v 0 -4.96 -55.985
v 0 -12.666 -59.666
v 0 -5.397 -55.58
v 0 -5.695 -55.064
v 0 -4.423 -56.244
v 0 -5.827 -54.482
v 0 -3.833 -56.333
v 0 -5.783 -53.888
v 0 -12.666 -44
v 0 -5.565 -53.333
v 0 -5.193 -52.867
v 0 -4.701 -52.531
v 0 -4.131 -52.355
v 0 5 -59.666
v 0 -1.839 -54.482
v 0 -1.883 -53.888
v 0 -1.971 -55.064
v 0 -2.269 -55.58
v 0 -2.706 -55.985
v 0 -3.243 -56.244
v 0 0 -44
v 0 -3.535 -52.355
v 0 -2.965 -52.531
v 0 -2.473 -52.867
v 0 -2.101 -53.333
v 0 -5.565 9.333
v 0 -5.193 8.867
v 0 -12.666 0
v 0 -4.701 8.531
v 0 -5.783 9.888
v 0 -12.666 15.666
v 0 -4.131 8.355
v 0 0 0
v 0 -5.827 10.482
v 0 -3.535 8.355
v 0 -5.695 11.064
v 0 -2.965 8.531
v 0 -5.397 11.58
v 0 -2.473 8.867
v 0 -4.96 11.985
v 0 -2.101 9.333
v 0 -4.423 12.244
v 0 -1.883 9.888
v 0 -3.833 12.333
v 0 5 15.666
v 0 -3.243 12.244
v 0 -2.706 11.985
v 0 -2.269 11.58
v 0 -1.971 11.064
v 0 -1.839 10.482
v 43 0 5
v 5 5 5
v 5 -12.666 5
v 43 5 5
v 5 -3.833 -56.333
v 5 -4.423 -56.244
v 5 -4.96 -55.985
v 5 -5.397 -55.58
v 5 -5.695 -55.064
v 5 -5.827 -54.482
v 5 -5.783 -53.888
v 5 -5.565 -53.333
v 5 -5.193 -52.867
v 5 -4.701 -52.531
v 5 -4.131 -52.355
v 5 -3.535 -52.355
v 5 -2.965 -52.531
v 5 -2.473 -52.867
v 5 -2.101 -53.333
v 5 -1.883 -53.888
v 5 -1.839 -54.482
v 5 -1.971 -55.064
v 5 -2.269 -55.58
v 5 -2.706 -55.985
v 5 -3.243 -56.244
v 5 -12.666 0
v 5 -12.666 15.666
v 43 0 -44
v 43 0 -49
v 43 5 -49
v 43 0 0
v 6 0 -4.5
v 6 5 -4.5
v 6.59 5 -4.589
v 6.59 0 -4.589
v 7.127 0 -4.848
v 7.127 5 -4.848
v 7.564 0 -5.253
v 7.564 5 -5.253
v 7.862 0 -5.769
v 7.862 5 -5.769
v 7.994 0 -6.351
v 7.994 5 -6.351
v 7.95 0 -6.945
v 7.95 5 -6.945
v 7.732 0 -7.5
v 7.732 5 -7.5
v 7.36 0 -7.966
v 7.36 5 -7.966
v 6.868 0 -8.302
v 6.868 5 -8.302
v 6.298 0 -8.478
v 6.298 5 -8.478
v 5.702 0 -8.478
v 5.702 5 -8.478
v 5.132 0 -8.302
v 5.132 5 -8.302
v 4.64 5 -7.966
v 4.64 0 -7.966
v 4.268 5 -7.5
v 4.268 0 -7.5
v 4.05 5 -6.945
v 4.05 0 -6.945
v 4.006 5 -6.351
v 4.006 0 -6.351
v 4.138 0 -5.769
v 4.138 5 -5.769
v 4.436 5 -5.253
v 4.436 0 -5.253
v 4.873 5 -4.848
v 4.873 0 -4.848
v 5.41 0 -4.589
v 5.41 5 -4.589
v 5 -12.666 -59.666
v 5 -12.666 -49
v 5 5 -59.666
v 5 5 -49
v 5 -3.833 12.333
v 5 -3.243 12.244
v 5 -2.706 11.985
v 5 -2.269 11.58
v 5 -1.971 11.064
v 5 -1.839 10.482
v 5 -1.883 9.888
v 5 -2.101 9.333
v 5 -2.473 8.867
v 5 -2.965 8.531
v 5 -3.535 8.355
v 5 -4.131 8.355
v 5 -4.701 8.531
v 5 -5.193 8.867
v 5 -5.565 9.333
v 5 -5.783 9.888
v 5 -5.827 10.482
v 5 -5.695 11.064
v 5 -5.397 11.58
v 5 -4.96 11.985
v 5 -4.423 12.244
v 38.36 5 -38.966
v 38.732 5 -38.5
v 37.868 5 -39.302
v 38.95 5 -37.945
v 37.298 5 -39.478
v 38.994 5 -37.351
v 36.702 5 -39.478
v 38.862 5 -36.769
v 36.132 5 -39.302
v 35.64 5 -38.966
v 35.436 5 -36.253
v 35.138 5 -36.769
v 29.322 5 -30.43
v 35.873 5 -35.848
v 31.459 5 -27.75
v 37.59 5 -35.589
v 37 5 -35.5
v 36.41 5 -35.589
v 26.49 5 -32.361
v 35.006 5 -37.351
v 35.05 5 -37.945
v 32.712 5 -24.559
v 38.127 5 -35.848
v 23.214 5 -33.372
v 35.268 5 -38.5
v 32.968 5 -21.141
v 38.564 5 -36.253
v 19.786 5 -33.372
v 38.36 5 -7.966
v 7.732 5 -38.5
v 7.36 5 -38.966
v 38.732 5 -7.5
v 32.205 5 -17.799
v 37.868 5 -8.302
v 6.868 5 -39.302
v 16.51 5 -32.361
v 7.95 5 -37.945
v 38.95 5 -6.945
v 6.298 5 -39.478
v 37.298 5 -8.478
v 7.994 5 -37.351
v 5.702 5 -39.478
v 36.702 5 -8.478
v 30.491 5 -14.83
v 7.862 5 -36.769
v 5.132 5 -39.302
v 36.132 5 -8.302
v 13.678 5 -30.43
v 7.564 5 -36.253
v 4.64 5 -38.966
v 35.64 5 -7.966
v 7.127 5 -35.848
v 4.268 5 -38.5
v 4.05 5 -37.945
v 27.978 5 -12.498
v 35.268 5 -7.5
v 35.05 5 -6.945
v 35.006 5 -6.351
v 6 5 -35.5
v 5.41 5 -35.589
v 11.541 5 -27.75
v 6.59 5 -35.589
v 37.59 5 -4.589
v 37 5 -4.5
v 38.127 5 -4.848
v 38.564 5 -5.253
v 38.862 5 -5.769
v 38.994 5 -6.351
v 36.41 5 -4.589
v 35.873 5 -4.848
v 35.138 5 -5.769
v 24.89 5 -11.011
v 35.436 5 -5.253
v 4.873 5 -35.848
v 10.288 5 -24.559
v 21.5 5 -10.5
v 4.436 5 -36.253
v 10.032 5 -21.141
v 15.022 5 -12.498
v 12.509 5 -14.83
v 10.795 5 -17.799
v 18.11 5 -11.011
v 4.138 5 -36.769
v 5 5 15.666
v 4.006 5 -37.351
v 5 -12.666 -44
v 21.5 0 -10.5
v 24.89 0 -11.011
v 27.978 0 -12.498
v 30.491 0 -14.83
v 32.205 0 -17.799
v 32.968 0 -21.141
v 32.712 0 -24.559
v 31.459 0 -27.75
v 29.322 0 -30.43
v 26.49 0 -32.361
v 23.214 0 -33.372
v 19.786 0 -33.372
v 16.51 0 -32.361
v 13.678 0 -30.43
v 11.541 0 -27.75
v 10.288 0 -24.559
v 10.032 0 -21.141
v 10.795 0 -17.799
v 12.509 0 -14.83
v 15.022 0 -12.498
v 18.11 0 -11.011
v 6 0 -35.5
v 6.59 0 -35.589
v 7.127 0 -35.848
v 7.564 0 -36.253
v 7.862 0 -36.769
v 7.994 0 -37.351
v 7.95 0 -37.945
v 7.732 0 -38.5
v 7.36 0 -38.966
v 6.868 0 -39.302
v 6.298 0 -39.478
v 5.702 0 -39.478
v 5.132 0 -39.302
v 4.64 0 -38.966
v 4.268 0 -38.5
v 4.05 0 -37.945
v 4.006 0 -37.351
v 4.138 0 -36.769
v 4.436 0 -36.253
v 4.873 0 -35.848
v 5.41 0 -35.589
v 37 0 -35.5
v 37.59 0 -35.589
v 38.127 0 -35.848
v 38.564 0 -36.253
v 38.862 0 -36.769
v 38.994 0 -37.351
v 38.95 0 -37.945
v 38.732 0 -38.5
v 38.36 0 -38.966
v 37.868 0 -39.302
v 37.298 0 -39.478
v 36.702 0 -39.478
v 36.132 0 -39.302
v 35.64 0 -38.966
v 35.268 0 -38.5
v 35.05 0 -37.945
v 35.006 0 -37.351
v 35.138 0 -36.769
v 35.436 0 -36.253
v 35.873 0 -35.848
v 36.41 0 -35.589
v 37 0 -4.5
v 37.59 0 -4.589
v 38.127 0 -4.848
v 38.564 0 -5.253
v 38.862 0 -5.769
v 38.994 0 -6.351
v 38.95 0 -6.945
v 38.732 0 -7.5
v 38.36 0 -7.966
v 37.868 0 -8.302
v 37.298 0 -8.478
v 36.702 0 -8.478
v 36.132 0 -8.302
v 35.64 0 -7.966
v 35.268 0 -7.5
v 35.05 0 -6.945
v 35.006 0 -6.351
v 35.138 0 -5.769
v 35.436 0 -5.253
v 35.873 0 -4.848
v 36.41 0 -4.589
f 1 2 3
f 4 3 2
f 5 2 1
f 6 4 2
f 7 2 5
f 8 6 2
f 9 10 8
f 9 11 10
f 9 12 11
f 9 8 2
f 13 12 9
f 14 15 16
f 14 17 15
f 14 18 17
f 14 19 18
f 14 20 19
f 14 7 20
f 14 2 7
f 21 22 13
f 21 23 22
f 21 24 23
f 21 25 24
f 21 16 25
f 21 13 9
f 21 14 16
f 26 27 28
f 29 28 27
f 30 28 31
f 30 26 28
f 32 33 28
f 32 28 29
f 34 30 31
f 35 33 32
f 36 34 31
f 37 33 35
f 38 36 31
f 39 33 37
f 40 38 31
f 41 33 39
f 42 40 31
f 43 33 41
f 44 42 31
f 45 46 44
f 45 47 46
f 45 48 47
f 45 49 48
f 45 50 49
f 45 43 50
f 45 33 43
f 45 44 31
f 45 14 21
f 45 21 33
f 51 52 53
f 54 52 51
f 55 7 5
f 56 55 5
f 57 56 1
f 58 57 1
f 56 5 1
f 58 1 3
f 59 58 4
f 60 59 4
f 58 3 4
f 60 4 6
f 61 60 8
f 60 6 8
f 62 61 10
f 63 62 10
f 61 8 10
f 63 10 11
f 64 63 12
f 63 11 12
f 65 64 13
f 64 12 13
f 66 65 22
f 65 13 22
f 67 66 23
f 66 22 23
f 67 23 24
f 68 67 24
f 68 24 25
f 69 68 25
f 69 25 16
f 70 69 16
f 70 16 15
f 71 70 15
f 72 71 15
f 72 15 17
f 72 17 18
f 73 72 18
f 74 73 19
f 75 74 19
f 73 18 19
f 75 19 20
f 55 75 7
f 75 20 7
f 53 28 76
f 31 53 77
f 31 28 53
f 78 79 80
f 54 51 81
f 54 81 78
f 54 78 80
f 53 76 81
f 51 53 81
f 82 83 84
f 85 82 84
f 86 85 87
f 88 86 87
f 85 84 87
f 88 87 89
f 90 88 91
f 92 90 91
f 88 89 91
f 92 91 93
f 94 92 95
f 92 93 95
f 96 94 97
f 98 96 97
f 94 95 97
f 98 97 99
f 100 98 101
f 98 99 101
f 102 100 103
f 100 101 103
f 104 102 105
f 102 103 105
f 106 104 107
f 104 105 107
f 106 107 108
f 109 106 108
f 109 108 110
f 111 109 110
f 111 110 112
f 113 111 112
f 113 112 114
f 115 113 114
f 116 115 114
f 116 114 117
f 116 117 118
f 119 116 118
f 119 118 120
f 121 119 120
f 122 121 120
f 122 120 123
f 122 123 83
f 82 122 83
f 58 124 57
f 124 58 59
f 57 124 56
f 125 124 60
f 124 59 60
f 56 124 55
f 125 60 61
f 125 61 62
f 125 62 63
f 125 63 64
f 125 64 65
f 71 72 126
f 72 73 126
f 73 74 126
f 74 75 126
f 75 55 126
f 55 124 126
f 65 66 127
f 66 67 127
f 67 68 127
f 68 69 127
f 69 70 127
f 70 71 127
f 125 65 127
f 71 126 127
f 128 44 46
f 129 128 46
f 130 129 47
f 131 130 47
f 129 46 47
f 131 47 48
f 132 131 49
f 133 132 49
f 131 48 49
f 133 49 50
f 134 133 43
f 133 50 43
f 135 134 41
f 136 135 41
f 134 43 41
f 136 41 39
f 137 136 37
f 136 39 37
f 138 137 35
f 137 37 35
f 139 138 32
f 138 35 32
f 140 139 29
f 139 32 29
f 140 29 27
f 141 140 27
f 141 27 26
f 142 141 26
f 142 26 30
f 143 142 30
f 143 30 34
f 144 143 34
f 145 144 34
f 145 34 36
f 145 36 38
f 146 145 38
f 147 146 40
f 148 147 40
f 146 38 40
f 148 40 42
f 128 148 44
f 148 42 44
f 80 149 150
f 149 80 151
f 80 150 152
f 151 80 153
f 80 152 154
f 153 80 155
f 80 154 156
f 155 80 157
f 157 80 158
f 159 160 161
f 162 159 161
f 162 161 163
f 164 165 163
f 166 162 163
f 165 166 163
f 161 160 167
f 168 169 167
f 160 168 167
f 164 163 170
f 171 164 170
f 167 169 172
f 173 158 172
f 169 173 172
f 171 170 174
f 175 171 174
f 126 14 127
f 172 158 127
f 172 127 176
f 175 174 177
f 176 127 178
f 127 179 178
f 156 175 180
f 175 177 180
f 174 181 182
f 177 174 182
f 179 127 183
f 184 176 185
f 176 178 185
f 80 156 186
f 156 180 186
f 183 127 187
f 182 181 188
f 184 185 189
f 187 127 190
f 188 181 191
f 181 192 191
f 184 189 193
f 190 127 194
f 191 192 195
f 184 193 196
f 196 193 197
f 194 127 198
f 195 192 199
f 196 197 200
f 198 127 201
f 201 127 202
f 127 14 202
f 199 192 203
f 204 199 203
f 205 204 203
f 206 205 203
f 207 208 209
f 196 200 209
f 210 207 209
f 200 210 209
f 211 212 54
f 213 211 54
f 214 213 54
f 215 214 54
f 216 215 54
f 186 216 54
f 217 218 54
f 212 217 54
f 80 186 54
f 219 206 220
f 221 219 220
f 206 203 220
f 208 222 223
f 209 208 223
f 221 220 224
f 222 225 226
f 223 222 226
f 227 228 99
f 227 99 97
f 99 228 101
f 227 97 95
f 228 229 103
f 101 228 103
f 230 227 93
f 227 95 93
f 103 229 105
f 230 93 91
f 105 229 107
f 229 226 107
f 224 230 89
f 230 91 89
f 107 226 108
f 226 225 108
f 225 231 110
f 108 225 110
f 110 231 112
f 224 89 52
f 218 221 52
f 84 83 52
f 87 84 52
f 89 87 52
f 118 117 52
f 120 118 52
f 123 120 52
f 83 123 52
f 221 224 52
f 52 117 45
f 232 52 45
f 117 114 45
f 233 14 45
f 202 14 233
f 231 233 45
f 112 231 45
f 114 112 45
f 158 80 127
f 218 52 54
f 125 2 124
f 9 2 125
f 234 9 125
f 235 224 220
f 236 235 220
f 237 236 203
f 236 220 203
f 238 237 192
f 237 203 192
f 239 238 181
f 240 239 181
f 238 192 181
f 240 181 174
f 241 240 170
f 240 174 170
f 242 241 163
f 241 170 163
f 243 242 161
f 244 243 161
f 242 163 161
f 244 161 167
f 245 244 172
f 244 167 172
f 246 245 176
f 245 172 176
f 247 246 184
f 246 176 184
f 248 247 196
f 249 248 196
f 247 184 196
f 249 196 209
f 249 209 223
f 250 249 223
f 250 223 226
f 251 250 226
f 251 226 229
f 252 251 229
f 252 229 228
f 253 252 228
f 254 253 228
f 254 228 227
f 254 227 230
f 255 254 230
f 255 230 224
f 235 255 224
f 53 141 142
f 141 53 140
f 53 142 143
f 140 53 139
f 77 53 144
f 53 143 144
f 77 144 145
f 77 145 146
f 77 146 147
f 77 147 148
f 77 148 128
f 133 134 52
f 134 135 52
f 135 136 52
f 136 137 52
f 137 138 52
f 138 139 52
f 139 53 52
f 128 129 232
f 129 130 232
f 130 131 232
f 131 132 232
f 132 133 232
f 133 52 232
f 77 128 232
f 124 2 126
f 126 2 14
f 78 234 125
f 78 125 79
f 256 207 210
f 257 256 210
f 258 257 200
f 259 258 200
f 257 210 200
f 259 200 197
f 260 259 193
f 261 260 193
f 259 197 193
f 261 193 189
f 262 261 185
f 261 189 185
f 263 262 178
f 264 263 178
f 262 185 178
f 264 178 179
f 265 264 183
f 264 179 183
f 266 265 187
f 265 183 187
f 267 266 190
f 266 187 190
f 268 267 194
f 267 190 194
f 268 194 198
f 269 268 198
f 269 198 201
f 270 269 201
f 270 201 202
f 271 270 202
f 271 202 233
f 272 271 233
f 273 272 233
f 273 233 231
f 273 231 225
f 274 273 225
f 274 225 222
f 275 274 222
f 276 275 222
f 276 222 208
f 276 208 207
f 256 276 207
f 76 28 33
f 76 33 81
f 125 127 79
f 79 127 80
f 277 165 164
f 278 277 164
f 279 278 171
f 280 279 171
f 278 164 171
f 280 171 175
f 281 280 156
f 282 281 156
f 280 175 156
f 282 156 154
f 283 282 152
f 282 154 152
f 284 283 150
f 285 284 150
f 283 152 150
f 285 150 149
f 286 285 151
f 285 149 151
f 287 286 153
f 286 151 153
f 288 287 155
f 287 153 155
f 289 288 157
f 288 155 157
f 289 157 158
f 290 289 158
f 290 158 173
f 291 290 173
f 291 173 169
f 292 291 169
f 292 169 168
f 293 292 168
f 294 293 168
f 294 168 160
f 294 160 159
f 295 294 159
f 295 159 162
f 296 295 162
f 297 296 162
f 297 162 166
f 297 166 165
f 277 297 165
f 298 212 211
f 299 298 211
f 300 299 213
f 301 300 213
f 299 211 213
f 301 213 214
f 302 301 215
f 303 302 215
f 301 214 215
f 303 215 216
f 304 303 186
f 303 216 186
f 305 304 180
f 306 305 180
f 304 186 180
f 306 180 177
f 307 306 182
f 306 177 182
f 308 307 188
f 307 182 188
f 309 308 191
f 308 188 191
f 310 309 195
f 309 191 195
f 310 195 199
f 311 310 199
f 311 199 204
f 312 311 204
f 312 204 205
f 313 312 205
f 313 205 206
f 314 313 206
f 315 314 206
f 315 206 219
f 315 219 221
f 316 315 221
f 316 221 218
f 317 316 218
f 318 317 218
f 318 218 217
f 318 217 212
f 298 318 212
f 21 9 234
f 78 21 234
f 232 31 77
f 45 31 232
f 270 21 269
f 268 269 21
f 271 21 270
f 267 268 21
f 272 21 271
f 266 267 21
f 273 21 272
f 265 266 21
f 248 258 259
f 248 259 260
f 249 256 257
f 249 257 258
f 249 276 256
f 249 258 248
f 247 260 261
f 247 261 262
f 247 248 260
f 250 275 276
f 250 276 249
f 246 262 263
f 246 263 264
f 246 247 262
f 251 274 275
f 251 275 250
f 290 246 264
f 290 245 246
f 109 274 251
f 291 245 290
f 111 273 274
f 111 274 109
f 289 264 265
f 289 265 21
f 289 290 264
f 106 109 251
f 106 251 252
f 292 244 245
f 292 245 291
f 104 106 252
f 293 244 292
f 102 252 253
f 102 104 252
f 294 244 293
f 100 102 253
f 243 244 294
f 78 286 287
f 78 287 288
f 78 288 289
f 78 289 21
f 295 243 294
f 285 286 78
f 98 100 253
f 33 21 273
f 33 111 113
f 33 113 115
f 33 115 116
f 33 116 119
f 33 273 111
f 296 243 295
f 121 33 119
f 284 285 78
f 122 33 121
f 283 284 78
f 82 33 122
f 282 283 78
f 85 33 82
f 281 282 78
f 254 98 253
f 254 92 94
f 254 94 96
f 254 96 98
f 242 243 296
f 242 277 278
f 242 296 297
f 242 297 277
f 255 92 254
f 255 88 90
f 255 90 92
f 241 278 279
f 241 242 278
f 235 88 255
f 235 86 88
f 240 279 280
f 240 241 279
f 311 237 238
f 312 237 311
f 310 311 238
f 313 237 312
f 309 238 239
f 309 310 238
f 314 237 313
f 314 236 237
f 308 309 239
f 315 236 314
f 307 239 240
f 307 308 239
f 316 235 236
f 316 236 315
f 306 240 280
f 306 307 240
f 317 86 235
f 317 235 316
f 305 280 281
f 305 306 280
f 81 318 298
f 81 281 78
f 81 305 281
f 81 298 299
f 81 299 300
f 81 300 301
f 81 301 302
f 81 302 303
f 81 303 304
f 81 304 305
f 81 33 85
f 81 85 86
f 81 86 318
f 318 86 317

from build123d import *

# Parameters (mm, degrees)
SKETCH1_W           = 5
SKETCH1_H           = 5
SKETCH1_W_2         = 38
BOSS_EXTRUDE1_DEPTH = 44
SKETCH2_R           = 11.5
SKETCH2_R_2         = 2
CUT_EXTRUDE1_DEPTH  = 62.725197448
SKETCH1_3_W         = 38
SKETCH1_3_H         = 5
SKETCH1_3_W_2       = 5
SKETCH1_3_H_2       = 12.666
BOSS_EXTRUDE2_DEPTH = 5
BOSS_EXTRUDE3_START = -44
SKETCH1_4_W         = 5
SKETCH1_4_H         = 5
SKETCH1_4_H_2       = 12.666
SKETCH1_4_W_2       = 38
BOSS_EXTRUDE3_DEPTH = 5
SKETCH3_W           = 10.666
SKETCH3_H           = 17.666
SKETCH3_R           = 2
BOSS_EXTRUDE4_DEPTH = 5


with BuildPart() as part:
    # Sketch1 → Boss-Extrude1 (new body)
    with BuildSketch(Plane.XY):
        with Locations((2.5, 2.5)):
            Rectangle(SKETCH1_W, SKETCH1_H)
        with Locations((24, 2.5)):
            Rectangle(SKETCH1_W_2, SKETCH1_H)
    extrude(amount=-BOSS_EXTRUDE1_DEPTH)

    # Sketch2 → Cut-Extrude1 (cut, through all)
    with BuildSketch(Plane(origin=(0, 5, 0), x_dir=(1, 0, 0), z_dir=(0, 1, 0))):
        with Locations(Location((21.5, 22, 0), (0, 0, 270))):
            Circle(SKETCH2_R)
        with Locations(Location((37, 37.5, 0), (0, 0, 270))):
            Circle(SKETCH2_R_2)
        with Locations(Location((6, 37.5, 0), (0, 0, 270))):
            Circle(SKETCH2_R_2)
        with Locations(Location((6, 6.5, 0), (0, 0, 270))):
            Circle(SKETCH2_R_2)
        with Locations(Location((37, 6.5, 0), (0, 0, 270))):
            Circle(SKETCH2_R_2)
    extrude(amount=-CUT_EXTRUDE1_DEPTH, mode=Mode.SUBTRACT)

    # Sketch1<3> → Boss-Extrude2 (add)
    with BuildSketch(Plane.XY):
        Polygon((5, 0), (5, -12.666), (43, 0), align=None)
        with Locations((24, 2.5)):
            Rectangle(SKETCH1_3_W, SKETCH1_3_H)
        with Locations((2.5, 2.5)):
            Rectangle(SKETCH1_3_W_2, SKETCH1_3_H)
        with Locations((2.5, -6.333)):
            Rectangle(SKETCH1_3_W_2, SKETCH1_3_H_2)
    extrude(amount=BOSS_EXTRUDE2_DEPTH)

    # Sketch1<4> → Boss-Extrude3 (add)
    with BuildSketch(Plane.XY.offset(BOSS_EXTRUDE3_START)):
        with Locations((2.5, 2.5)):
            Rectangle(SKETCH1_4_W, SKETCH1_4_H)
        with Locations((2.5, -6.333)):
            Rectangle(SKETCH1_4_W, SKETCH1_4_H_2)
        Polygon((5, 0), (5, -12.666), (43, 0), align=None)
        with Locations((24, 2.5)):
            Rectangle(SKETCH1_4_W_2, SKETCH1_4_H)
    extrude(amount=-BOSS_EXTRUDE3_DEPTH)

    # Sketch3 → Boss-Extrude4 (add)
    # profile 1 of 2: a face of its own
    with BuildSketch(Plane.ZY):
        with Locations((10.333, -3.833)):
            Rectangle(SKETCH3_W, SKETCH3_H)
        with Locations((10.333, -3.833)):
            Circle(SKETCH3_R, mode=Mode.SUBTRACT)
    # profile 2 of 2: a face of its own
    with BuildSketch(Plane.ZY):
        with Locations((-54.333, -3.833)):
            Rectangle(SKETCH3_W, SKETCH3_H)
        with Locations(Location((-54.333, -3.833, 0), (0, 0, 180))):
            Circle(SKETCH3_R, mode=Mode.SUBTRACT)
    extrude(amount=-BOSS_EXTRUDE4_DEPTH)


solid = part.part
